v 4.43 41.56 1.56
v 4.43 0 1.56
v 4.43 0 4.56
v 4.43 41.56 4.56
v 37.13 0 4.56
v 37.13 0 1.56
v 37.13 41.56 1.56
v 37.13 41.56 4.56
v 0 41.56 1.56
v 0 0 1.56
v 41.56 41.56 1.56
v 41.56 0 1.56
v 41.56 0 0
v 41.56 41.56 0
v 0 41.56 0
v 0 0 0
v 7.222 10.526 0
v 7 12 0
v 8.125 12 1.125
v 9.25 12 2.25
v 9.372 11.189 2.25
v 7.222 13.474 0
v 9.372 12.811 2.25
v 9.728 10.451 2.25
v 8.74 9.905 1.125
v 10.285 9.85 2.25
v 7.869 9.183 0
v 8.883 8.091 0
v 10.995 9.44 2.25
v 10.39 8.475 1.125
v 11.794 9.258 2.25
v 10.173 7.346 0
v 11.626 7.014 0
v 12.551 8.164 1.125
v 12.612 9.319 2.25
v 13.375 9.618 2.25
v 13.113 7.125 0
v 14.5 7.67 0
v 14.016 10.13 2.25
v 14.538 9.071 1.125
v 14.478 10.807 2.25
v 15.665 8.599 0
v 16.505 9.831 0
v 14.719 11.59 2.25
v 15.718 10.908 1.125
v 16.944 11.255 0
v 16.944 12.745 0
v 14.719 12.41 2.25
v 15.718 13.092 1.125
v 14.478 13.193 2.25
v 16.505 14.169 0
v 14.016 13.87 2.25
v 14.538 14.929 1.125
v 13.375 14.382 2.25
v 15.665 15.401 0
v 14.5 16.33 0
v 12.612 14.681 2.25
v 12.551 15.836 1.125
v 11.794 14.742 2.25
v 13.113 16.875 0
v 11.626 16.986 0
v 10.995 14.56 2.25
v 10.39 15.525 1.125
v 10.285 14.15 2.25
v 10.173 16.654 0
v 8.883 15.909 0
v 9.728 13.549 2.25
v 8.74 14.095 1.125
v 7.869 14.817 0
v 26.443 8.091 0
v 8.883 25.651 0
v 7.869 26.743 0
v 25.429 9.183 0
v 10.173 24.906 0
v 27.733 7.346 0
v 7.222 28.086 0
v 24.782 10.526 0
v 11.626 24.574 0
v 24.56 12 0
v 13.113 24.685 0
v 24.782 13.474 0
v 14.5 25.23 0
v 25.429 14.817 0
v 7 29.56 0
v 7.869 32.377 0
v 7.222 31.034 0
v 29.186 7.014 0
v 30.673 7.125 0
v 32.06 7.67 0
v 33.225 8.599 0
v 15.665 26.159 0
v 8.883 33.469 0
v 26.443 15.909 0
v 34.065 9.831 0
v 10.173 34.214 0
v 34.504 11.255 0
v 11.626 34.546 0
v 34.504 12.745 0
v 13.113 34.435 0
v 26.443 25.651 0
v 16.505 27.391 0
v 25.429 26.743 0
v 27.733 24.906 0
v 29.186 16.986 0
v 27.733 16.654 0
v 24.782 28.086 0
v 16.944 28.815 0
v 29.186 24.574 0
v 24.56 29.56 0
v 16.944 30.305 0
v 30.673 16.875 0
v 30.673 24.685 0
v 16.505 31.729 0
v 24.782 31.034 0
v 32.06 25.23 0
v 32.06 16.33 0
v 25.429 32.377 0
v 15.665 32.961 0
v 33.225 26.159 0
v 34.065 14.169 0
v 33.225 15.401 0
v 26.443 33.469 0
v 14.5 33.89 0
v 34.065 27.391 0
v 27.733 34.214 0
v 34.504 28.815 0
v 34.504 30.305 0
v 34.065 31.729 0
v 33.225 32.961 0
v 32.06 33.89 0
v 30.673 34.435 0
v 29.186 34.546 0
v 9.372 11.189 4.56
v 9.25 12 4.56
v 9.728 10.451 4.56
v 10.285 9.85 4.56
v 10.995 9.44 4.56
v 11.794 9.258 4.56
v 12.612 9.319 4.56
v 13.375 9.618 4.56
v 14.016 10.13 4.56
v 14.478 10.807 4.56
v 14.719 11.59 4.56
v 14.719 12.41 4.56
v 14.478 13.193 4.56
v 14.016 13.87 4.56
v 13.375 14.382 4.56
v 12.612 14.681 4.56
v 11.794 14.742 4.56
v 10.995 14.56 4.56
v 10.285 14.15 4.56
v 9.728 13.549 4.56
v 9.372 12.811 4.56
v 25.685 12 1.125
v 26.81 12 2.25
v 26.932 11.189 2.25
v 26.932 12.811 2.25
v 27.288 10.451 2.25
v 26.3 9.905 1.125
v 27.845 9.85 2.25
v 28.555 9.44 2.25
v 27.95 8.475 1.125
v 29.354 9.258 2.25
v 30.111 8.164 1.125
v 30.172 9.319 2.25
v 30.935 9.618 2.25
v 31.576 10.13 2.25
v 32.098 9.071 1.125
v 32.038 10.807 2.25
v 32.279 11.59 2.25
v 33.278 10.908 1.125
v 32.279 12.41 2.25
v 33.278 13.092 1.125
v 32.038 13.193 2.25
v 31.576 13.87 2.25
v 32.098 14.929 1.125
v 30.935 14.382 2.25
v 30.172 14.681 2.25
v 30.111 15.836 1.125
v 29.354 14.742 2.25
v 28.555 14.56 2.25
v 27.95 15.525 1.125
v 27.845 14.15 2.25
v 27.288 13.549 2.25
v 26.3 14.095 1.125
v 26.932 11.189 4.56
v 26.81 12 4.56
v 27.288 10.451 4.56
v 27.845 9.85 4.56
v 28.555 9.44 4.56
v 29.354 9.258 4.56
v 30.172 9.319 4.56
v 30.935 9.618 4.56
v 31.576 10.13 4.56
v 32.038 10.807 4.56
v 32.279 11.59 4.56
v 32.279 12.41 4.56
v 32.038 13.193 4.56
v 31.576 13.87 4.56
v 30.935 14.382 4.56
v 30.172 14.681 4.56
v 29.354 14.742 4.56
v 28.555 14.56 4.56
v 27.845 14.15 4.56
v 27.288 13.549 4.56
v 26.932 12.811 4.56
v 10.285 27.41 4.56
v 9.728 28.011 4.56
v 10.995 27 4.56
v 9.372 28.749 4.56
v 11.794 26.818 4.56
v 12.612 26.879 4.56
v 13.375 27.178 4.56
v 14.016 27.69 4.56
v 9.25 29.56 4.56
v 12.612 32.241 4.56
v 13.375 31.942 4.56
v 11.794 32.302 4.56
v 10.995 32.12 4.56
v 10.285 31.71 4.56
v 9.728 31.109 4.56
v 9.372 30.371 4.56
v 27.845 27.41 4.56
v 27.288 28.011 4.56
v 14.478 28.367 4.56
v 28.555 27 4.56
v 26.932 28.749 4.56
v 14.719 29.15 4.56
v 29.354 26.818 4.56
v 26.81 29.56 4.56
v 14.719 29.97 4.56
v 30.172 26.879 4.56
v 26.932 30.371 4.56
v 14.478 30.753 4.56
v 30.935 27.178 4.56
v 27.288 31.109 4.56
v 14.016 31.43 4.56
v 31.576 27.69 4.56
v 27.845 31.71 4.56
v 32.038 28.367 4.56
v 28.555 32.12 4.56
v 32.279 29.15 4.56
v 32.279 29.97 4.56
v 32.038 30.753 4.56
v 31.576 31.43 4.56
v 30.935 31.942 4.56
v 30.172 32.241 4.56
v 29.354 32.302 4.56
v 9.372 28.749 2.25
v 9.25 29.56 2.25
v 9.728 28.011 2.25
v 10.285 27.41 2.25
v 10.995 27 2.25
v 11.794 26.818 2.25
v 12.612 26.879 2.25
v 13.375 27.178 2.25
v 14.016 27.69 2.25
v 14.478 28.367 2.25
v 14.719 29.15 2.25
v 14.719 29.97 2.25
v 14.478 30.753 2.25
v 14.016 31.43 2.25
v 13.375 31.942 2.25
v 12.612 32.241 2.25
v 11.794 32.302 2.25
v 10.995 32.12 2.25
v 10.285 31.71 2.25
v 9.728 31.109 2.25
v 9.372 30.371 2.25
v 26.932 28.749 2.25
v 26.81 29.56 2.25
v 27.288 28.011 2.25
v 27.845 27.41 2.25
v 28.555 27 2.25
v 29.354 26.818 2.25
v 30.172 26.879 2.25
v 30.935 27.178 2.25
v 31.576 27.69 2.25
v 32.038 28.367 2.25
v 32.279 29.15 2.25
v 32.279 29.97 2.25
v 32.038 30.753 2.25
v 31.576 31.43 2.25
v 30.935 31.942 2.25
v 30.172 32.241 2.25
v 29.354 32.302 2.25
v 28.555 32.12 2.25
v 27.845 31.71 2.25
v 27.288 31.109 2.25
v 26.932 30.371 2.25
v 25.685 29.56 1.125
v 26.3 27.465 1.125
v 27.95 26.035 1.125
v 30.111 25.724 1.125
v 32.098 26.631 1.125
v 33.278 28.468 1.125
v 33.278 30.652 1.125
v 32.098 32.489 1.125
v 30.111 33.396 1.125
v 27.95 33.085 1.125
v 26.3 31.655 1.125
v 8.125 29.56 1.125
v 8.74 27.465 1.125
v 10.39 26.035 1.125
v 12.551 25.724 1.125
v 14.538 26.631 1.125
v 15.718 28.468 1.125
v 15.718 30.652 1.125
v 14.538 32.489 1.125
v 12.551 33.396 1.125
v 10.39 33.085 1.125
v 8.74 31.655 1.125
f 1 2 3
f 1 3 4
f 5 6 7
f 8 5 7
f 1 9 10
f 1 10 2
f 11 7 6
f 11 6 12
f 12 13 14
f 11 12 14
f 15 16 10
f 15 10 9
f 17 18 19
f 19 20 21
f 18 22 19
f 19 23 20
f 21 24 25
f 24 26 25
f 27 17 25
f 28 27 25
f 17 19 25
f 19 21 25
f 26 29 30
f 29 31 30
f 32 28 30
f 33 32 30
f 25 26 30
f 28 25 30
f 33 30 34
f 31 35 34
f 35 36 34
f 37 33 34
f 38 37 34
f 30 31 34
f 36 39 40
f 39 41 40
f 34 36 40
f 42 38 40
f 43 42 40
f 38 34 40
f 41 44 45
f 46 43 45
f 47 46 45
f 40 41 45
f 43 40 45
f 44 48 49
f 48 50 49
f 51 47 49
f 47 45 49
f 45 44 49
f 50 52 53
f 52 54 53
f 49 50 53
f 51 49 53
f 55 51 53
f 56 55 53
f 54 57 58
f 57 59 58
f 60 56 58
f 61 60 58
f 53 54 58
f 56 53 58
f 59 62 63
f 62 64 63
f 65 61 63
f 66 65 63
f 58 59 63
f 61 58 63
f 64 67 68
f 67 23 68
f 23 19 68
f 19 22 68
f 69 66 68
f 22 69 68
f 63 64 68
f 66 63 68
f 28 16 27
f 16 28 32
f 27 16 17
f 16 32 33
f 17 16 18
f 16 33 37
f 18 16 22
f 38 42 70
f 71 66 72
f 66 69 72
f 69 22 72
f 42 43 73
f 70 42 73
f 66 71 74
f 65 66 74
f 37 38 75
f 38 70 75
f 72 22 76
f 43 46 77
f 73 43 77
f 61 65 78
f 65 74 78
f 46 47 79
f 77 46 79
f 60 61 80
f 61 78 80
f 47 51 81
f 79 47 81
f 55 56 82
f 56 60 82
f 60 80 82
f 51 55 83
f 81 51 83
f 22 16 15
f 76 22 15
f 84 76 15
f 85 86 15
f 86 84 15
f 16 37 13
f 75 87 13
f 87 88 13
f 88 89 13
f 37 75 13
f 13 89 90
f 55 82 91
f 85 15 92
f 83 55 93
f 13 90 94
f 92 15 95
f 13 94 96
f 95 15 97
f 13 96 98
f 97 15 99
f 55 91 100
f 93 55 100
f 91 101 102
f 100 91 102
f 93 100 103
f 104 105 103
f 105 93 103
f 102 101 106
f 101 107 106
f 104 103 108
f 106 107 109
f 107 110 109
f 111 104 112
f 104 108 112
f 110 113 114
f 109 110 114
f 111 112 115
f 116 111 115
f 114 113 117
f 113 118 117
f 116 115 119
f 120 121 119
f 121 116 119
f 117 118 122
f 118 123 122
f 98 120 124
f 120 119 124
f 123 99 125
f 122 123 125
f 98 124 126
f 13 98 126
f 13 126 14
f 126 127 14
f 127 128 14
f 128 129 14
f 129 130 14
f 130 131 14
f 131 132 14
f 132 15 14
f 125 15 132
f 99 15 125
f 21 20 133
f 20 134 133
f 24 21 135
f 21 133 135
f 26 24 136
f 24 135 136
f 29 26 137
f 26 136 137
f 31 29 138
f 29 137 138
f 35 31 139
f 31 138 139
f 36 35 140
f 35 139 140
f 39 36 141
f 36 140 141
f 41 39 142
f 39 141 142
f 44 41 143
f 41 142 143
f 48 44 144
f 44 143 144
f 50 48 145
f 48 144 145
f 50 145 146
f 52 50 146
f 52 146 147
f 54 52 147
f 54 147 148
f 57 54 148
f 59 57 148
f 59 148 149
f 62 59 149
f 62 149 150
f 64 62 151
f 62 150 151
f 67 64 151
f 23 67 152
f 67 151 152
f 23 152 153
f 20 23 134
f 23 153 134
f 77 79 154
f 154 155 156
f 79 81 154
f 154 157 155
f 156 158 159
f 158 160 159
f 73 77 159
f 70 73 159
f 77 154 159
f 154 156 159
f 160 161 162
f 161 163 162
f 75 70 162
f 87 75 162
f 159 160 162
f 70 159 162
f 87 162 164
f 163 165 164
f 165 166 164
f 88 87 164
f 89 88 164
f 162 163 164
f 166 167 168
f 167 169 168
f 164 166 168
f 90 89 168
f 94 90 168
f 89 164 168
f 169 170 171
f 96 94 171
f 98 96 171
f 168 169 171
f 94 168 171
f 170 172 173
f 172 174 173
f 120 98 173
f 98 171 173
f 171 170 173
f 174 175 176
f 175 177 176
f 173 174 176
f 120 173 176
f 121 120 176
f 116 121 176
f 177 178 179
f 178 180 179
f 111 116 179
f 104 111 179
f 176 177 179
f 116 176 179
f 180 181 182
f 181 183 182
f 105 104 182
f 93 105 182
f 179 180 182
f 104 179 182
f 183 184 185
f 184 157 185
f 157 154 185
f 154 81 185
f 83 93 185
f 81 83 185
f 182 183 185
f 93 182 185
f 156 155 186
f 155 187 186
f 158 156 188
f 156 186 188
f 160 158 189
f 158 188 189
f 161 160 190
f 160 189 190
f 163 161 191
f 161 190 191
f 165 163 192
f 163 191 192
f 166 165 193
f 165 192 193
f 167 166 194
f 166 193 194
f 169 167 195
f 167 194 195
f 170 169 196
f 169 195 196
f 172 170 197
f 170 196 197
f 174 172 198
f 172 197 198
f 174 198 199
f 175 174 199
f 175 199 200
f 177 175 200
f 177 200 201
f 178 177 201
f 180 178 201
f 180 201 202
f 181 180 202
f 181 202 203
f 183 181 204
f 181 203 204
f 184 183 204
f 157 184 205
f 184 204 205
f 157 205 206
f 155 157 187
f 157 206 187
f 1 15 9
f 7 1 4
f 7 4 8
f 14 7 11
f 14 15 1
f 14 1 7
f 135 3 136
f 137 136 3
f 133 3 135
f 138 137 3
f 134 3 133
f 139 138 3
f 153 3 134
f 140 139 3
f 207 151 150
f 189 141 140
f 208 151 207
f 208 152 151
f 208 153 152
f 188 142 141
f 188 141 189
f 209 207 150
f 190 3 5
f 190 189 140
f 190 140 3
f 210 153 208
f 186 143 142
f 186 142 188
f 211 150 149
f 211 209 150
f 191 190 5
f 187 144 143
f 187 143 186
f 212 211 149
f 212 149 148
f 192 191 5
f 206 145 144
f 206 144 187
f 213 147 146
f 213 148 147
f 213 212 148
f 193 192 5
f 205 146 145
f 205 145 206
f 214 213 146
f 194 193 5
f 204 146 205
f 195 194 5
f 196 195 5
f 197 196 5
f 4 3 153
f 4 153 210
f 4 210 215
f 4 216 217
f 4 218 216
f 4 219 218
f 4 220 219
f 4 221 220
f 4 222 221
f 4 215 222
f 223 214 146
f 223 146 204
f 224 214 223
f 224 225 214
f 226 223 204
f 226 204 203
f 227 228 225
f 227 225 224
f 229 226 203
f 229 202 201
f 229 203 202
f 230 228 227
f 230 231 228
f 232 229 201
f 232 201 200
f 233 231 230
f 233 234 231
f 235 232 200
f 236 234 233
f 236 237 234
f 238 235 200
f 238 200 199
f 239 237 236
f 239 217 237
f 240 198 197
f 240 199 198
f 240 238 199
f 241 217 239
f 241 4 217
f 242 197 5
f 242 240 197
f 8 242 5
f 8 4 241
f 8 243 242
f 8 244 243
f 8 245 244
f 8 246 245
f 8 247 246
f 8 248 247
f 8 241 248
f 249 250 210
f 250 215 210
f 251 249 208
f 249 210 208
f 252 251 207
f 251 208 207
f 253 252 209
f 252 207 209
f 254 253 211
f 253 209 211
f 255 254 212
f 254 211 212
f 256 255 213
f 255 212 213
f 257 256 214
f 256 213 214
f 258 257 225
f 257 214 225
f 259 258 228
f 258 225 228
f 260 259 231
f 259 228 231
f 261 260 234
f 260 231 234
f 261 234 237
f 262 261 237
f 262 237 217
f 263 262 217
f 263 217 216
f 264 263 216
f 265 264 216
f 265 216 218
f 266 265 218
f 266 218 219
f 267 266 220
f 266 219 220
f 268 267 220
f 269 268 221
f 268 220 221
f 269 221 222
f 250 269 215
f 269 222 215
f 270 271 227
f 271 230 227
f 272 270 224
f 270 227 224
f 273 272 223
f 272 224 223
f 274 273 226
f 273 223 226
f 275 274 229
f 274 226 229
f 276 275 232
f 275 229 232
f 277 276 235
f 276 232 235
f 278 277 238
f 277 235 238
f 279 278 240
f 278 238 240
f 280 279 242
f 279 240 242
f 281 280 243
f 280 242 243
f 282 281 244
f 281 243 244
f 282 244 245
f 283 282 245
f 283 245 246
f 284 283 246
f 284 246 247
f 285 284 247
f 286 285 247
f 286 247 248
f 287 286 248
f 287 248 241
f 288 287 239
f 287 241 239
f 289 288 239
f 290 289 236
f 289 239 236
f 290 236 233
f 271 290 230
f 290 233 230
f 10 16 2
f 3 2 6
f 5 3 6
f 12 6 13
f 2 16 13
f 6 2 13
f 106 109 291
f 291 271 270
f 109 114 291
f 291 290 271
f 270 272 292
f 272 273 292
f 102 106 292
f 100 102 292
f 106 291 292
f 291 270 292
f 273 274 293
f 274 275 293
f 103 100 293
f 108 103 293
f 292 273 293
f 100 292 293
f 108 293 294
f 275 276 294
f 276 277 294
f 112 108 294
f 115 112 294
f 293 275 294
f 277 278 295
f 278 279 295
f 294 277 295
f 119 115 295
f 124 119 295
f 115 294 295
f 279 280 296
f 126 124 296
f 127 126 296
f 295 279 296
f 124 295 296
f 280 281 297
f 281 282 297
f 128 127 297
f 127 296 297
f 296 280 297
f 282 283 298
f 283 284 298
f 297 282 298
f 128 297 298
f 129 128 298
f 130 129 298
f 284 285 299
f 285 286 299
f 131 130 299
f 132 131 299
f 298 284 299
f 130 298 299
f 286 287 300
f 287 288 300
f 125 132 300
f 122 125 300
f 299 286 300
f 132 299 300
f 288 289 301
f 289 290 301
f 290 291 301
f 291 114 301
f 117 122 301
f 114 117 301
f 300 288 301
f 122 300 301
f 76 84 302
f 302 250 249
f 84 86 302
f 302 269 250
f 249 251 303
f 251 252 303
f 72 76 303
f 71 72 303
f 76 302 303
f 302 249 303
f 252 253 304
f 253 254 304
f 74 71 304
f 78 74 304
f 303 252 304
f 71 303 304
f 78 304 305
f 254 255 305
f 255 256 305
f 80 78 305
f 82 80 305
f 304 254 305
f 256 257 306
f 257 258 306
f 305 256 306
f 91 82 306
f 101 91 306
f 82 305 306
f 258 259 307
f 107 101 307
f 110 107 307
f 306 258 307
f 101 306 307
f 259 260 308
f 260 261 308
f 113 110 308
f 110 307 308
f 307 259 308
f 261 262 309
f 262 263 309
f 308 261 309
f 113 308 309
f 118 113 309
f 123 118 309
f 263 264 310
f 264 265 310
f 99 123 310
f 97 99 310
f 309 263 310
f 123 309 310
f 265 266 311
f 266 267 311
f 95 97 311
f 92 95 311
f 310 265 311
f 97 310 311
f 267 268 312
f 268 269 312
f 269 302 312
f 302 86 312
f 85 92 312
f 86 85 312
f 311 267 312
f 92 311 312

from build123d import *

# Parameters (mm, degrees)
F0_W           = 41.56
F0_H           = 41.56
F1_DEPTH       = 1.56
F2_W           = 32.7
F2_H           = 41.56
F3_DEPTH       = 3
F5_D           = 5.5
F5_DEPTH       = 8
F5_CSINK_D     = 10
F5_CSINK_ANGLE = 90


with BuildPart() as f1:
    # F0 (on Top) → F1 (new body)
    with BuildSketch(Plane.XY):
        with Locations((20.78, 20.78)):
            Rectangle(F0_W, F0_H)
    extrude(amount=F1_DEPTH)

    # F2 (on face) → F3 (join)
    with BuildSketch(Plane.XY.offset(1.56)):
        with Locations((20.78, 20.78)):
            Rectangle(F2_W, F2_H)
    extrude(amount=F3_DEPTH)

    # F5
    with Locations(Plane(origin=(0, 0, 0), x_dir=(1, 0, 0), z_dir=(0, 0, -1))):
        with Locations((12, -12), (29.56, -12), (12, -29.56), (29.56, -29.56)):
            CounterSinkHole(F5_D / 2, F5_CSINK_D / 2, depth=F5_DEPTH, counter_sink_angle=F5_CSINK_ANGLE)


solid = f1.part
